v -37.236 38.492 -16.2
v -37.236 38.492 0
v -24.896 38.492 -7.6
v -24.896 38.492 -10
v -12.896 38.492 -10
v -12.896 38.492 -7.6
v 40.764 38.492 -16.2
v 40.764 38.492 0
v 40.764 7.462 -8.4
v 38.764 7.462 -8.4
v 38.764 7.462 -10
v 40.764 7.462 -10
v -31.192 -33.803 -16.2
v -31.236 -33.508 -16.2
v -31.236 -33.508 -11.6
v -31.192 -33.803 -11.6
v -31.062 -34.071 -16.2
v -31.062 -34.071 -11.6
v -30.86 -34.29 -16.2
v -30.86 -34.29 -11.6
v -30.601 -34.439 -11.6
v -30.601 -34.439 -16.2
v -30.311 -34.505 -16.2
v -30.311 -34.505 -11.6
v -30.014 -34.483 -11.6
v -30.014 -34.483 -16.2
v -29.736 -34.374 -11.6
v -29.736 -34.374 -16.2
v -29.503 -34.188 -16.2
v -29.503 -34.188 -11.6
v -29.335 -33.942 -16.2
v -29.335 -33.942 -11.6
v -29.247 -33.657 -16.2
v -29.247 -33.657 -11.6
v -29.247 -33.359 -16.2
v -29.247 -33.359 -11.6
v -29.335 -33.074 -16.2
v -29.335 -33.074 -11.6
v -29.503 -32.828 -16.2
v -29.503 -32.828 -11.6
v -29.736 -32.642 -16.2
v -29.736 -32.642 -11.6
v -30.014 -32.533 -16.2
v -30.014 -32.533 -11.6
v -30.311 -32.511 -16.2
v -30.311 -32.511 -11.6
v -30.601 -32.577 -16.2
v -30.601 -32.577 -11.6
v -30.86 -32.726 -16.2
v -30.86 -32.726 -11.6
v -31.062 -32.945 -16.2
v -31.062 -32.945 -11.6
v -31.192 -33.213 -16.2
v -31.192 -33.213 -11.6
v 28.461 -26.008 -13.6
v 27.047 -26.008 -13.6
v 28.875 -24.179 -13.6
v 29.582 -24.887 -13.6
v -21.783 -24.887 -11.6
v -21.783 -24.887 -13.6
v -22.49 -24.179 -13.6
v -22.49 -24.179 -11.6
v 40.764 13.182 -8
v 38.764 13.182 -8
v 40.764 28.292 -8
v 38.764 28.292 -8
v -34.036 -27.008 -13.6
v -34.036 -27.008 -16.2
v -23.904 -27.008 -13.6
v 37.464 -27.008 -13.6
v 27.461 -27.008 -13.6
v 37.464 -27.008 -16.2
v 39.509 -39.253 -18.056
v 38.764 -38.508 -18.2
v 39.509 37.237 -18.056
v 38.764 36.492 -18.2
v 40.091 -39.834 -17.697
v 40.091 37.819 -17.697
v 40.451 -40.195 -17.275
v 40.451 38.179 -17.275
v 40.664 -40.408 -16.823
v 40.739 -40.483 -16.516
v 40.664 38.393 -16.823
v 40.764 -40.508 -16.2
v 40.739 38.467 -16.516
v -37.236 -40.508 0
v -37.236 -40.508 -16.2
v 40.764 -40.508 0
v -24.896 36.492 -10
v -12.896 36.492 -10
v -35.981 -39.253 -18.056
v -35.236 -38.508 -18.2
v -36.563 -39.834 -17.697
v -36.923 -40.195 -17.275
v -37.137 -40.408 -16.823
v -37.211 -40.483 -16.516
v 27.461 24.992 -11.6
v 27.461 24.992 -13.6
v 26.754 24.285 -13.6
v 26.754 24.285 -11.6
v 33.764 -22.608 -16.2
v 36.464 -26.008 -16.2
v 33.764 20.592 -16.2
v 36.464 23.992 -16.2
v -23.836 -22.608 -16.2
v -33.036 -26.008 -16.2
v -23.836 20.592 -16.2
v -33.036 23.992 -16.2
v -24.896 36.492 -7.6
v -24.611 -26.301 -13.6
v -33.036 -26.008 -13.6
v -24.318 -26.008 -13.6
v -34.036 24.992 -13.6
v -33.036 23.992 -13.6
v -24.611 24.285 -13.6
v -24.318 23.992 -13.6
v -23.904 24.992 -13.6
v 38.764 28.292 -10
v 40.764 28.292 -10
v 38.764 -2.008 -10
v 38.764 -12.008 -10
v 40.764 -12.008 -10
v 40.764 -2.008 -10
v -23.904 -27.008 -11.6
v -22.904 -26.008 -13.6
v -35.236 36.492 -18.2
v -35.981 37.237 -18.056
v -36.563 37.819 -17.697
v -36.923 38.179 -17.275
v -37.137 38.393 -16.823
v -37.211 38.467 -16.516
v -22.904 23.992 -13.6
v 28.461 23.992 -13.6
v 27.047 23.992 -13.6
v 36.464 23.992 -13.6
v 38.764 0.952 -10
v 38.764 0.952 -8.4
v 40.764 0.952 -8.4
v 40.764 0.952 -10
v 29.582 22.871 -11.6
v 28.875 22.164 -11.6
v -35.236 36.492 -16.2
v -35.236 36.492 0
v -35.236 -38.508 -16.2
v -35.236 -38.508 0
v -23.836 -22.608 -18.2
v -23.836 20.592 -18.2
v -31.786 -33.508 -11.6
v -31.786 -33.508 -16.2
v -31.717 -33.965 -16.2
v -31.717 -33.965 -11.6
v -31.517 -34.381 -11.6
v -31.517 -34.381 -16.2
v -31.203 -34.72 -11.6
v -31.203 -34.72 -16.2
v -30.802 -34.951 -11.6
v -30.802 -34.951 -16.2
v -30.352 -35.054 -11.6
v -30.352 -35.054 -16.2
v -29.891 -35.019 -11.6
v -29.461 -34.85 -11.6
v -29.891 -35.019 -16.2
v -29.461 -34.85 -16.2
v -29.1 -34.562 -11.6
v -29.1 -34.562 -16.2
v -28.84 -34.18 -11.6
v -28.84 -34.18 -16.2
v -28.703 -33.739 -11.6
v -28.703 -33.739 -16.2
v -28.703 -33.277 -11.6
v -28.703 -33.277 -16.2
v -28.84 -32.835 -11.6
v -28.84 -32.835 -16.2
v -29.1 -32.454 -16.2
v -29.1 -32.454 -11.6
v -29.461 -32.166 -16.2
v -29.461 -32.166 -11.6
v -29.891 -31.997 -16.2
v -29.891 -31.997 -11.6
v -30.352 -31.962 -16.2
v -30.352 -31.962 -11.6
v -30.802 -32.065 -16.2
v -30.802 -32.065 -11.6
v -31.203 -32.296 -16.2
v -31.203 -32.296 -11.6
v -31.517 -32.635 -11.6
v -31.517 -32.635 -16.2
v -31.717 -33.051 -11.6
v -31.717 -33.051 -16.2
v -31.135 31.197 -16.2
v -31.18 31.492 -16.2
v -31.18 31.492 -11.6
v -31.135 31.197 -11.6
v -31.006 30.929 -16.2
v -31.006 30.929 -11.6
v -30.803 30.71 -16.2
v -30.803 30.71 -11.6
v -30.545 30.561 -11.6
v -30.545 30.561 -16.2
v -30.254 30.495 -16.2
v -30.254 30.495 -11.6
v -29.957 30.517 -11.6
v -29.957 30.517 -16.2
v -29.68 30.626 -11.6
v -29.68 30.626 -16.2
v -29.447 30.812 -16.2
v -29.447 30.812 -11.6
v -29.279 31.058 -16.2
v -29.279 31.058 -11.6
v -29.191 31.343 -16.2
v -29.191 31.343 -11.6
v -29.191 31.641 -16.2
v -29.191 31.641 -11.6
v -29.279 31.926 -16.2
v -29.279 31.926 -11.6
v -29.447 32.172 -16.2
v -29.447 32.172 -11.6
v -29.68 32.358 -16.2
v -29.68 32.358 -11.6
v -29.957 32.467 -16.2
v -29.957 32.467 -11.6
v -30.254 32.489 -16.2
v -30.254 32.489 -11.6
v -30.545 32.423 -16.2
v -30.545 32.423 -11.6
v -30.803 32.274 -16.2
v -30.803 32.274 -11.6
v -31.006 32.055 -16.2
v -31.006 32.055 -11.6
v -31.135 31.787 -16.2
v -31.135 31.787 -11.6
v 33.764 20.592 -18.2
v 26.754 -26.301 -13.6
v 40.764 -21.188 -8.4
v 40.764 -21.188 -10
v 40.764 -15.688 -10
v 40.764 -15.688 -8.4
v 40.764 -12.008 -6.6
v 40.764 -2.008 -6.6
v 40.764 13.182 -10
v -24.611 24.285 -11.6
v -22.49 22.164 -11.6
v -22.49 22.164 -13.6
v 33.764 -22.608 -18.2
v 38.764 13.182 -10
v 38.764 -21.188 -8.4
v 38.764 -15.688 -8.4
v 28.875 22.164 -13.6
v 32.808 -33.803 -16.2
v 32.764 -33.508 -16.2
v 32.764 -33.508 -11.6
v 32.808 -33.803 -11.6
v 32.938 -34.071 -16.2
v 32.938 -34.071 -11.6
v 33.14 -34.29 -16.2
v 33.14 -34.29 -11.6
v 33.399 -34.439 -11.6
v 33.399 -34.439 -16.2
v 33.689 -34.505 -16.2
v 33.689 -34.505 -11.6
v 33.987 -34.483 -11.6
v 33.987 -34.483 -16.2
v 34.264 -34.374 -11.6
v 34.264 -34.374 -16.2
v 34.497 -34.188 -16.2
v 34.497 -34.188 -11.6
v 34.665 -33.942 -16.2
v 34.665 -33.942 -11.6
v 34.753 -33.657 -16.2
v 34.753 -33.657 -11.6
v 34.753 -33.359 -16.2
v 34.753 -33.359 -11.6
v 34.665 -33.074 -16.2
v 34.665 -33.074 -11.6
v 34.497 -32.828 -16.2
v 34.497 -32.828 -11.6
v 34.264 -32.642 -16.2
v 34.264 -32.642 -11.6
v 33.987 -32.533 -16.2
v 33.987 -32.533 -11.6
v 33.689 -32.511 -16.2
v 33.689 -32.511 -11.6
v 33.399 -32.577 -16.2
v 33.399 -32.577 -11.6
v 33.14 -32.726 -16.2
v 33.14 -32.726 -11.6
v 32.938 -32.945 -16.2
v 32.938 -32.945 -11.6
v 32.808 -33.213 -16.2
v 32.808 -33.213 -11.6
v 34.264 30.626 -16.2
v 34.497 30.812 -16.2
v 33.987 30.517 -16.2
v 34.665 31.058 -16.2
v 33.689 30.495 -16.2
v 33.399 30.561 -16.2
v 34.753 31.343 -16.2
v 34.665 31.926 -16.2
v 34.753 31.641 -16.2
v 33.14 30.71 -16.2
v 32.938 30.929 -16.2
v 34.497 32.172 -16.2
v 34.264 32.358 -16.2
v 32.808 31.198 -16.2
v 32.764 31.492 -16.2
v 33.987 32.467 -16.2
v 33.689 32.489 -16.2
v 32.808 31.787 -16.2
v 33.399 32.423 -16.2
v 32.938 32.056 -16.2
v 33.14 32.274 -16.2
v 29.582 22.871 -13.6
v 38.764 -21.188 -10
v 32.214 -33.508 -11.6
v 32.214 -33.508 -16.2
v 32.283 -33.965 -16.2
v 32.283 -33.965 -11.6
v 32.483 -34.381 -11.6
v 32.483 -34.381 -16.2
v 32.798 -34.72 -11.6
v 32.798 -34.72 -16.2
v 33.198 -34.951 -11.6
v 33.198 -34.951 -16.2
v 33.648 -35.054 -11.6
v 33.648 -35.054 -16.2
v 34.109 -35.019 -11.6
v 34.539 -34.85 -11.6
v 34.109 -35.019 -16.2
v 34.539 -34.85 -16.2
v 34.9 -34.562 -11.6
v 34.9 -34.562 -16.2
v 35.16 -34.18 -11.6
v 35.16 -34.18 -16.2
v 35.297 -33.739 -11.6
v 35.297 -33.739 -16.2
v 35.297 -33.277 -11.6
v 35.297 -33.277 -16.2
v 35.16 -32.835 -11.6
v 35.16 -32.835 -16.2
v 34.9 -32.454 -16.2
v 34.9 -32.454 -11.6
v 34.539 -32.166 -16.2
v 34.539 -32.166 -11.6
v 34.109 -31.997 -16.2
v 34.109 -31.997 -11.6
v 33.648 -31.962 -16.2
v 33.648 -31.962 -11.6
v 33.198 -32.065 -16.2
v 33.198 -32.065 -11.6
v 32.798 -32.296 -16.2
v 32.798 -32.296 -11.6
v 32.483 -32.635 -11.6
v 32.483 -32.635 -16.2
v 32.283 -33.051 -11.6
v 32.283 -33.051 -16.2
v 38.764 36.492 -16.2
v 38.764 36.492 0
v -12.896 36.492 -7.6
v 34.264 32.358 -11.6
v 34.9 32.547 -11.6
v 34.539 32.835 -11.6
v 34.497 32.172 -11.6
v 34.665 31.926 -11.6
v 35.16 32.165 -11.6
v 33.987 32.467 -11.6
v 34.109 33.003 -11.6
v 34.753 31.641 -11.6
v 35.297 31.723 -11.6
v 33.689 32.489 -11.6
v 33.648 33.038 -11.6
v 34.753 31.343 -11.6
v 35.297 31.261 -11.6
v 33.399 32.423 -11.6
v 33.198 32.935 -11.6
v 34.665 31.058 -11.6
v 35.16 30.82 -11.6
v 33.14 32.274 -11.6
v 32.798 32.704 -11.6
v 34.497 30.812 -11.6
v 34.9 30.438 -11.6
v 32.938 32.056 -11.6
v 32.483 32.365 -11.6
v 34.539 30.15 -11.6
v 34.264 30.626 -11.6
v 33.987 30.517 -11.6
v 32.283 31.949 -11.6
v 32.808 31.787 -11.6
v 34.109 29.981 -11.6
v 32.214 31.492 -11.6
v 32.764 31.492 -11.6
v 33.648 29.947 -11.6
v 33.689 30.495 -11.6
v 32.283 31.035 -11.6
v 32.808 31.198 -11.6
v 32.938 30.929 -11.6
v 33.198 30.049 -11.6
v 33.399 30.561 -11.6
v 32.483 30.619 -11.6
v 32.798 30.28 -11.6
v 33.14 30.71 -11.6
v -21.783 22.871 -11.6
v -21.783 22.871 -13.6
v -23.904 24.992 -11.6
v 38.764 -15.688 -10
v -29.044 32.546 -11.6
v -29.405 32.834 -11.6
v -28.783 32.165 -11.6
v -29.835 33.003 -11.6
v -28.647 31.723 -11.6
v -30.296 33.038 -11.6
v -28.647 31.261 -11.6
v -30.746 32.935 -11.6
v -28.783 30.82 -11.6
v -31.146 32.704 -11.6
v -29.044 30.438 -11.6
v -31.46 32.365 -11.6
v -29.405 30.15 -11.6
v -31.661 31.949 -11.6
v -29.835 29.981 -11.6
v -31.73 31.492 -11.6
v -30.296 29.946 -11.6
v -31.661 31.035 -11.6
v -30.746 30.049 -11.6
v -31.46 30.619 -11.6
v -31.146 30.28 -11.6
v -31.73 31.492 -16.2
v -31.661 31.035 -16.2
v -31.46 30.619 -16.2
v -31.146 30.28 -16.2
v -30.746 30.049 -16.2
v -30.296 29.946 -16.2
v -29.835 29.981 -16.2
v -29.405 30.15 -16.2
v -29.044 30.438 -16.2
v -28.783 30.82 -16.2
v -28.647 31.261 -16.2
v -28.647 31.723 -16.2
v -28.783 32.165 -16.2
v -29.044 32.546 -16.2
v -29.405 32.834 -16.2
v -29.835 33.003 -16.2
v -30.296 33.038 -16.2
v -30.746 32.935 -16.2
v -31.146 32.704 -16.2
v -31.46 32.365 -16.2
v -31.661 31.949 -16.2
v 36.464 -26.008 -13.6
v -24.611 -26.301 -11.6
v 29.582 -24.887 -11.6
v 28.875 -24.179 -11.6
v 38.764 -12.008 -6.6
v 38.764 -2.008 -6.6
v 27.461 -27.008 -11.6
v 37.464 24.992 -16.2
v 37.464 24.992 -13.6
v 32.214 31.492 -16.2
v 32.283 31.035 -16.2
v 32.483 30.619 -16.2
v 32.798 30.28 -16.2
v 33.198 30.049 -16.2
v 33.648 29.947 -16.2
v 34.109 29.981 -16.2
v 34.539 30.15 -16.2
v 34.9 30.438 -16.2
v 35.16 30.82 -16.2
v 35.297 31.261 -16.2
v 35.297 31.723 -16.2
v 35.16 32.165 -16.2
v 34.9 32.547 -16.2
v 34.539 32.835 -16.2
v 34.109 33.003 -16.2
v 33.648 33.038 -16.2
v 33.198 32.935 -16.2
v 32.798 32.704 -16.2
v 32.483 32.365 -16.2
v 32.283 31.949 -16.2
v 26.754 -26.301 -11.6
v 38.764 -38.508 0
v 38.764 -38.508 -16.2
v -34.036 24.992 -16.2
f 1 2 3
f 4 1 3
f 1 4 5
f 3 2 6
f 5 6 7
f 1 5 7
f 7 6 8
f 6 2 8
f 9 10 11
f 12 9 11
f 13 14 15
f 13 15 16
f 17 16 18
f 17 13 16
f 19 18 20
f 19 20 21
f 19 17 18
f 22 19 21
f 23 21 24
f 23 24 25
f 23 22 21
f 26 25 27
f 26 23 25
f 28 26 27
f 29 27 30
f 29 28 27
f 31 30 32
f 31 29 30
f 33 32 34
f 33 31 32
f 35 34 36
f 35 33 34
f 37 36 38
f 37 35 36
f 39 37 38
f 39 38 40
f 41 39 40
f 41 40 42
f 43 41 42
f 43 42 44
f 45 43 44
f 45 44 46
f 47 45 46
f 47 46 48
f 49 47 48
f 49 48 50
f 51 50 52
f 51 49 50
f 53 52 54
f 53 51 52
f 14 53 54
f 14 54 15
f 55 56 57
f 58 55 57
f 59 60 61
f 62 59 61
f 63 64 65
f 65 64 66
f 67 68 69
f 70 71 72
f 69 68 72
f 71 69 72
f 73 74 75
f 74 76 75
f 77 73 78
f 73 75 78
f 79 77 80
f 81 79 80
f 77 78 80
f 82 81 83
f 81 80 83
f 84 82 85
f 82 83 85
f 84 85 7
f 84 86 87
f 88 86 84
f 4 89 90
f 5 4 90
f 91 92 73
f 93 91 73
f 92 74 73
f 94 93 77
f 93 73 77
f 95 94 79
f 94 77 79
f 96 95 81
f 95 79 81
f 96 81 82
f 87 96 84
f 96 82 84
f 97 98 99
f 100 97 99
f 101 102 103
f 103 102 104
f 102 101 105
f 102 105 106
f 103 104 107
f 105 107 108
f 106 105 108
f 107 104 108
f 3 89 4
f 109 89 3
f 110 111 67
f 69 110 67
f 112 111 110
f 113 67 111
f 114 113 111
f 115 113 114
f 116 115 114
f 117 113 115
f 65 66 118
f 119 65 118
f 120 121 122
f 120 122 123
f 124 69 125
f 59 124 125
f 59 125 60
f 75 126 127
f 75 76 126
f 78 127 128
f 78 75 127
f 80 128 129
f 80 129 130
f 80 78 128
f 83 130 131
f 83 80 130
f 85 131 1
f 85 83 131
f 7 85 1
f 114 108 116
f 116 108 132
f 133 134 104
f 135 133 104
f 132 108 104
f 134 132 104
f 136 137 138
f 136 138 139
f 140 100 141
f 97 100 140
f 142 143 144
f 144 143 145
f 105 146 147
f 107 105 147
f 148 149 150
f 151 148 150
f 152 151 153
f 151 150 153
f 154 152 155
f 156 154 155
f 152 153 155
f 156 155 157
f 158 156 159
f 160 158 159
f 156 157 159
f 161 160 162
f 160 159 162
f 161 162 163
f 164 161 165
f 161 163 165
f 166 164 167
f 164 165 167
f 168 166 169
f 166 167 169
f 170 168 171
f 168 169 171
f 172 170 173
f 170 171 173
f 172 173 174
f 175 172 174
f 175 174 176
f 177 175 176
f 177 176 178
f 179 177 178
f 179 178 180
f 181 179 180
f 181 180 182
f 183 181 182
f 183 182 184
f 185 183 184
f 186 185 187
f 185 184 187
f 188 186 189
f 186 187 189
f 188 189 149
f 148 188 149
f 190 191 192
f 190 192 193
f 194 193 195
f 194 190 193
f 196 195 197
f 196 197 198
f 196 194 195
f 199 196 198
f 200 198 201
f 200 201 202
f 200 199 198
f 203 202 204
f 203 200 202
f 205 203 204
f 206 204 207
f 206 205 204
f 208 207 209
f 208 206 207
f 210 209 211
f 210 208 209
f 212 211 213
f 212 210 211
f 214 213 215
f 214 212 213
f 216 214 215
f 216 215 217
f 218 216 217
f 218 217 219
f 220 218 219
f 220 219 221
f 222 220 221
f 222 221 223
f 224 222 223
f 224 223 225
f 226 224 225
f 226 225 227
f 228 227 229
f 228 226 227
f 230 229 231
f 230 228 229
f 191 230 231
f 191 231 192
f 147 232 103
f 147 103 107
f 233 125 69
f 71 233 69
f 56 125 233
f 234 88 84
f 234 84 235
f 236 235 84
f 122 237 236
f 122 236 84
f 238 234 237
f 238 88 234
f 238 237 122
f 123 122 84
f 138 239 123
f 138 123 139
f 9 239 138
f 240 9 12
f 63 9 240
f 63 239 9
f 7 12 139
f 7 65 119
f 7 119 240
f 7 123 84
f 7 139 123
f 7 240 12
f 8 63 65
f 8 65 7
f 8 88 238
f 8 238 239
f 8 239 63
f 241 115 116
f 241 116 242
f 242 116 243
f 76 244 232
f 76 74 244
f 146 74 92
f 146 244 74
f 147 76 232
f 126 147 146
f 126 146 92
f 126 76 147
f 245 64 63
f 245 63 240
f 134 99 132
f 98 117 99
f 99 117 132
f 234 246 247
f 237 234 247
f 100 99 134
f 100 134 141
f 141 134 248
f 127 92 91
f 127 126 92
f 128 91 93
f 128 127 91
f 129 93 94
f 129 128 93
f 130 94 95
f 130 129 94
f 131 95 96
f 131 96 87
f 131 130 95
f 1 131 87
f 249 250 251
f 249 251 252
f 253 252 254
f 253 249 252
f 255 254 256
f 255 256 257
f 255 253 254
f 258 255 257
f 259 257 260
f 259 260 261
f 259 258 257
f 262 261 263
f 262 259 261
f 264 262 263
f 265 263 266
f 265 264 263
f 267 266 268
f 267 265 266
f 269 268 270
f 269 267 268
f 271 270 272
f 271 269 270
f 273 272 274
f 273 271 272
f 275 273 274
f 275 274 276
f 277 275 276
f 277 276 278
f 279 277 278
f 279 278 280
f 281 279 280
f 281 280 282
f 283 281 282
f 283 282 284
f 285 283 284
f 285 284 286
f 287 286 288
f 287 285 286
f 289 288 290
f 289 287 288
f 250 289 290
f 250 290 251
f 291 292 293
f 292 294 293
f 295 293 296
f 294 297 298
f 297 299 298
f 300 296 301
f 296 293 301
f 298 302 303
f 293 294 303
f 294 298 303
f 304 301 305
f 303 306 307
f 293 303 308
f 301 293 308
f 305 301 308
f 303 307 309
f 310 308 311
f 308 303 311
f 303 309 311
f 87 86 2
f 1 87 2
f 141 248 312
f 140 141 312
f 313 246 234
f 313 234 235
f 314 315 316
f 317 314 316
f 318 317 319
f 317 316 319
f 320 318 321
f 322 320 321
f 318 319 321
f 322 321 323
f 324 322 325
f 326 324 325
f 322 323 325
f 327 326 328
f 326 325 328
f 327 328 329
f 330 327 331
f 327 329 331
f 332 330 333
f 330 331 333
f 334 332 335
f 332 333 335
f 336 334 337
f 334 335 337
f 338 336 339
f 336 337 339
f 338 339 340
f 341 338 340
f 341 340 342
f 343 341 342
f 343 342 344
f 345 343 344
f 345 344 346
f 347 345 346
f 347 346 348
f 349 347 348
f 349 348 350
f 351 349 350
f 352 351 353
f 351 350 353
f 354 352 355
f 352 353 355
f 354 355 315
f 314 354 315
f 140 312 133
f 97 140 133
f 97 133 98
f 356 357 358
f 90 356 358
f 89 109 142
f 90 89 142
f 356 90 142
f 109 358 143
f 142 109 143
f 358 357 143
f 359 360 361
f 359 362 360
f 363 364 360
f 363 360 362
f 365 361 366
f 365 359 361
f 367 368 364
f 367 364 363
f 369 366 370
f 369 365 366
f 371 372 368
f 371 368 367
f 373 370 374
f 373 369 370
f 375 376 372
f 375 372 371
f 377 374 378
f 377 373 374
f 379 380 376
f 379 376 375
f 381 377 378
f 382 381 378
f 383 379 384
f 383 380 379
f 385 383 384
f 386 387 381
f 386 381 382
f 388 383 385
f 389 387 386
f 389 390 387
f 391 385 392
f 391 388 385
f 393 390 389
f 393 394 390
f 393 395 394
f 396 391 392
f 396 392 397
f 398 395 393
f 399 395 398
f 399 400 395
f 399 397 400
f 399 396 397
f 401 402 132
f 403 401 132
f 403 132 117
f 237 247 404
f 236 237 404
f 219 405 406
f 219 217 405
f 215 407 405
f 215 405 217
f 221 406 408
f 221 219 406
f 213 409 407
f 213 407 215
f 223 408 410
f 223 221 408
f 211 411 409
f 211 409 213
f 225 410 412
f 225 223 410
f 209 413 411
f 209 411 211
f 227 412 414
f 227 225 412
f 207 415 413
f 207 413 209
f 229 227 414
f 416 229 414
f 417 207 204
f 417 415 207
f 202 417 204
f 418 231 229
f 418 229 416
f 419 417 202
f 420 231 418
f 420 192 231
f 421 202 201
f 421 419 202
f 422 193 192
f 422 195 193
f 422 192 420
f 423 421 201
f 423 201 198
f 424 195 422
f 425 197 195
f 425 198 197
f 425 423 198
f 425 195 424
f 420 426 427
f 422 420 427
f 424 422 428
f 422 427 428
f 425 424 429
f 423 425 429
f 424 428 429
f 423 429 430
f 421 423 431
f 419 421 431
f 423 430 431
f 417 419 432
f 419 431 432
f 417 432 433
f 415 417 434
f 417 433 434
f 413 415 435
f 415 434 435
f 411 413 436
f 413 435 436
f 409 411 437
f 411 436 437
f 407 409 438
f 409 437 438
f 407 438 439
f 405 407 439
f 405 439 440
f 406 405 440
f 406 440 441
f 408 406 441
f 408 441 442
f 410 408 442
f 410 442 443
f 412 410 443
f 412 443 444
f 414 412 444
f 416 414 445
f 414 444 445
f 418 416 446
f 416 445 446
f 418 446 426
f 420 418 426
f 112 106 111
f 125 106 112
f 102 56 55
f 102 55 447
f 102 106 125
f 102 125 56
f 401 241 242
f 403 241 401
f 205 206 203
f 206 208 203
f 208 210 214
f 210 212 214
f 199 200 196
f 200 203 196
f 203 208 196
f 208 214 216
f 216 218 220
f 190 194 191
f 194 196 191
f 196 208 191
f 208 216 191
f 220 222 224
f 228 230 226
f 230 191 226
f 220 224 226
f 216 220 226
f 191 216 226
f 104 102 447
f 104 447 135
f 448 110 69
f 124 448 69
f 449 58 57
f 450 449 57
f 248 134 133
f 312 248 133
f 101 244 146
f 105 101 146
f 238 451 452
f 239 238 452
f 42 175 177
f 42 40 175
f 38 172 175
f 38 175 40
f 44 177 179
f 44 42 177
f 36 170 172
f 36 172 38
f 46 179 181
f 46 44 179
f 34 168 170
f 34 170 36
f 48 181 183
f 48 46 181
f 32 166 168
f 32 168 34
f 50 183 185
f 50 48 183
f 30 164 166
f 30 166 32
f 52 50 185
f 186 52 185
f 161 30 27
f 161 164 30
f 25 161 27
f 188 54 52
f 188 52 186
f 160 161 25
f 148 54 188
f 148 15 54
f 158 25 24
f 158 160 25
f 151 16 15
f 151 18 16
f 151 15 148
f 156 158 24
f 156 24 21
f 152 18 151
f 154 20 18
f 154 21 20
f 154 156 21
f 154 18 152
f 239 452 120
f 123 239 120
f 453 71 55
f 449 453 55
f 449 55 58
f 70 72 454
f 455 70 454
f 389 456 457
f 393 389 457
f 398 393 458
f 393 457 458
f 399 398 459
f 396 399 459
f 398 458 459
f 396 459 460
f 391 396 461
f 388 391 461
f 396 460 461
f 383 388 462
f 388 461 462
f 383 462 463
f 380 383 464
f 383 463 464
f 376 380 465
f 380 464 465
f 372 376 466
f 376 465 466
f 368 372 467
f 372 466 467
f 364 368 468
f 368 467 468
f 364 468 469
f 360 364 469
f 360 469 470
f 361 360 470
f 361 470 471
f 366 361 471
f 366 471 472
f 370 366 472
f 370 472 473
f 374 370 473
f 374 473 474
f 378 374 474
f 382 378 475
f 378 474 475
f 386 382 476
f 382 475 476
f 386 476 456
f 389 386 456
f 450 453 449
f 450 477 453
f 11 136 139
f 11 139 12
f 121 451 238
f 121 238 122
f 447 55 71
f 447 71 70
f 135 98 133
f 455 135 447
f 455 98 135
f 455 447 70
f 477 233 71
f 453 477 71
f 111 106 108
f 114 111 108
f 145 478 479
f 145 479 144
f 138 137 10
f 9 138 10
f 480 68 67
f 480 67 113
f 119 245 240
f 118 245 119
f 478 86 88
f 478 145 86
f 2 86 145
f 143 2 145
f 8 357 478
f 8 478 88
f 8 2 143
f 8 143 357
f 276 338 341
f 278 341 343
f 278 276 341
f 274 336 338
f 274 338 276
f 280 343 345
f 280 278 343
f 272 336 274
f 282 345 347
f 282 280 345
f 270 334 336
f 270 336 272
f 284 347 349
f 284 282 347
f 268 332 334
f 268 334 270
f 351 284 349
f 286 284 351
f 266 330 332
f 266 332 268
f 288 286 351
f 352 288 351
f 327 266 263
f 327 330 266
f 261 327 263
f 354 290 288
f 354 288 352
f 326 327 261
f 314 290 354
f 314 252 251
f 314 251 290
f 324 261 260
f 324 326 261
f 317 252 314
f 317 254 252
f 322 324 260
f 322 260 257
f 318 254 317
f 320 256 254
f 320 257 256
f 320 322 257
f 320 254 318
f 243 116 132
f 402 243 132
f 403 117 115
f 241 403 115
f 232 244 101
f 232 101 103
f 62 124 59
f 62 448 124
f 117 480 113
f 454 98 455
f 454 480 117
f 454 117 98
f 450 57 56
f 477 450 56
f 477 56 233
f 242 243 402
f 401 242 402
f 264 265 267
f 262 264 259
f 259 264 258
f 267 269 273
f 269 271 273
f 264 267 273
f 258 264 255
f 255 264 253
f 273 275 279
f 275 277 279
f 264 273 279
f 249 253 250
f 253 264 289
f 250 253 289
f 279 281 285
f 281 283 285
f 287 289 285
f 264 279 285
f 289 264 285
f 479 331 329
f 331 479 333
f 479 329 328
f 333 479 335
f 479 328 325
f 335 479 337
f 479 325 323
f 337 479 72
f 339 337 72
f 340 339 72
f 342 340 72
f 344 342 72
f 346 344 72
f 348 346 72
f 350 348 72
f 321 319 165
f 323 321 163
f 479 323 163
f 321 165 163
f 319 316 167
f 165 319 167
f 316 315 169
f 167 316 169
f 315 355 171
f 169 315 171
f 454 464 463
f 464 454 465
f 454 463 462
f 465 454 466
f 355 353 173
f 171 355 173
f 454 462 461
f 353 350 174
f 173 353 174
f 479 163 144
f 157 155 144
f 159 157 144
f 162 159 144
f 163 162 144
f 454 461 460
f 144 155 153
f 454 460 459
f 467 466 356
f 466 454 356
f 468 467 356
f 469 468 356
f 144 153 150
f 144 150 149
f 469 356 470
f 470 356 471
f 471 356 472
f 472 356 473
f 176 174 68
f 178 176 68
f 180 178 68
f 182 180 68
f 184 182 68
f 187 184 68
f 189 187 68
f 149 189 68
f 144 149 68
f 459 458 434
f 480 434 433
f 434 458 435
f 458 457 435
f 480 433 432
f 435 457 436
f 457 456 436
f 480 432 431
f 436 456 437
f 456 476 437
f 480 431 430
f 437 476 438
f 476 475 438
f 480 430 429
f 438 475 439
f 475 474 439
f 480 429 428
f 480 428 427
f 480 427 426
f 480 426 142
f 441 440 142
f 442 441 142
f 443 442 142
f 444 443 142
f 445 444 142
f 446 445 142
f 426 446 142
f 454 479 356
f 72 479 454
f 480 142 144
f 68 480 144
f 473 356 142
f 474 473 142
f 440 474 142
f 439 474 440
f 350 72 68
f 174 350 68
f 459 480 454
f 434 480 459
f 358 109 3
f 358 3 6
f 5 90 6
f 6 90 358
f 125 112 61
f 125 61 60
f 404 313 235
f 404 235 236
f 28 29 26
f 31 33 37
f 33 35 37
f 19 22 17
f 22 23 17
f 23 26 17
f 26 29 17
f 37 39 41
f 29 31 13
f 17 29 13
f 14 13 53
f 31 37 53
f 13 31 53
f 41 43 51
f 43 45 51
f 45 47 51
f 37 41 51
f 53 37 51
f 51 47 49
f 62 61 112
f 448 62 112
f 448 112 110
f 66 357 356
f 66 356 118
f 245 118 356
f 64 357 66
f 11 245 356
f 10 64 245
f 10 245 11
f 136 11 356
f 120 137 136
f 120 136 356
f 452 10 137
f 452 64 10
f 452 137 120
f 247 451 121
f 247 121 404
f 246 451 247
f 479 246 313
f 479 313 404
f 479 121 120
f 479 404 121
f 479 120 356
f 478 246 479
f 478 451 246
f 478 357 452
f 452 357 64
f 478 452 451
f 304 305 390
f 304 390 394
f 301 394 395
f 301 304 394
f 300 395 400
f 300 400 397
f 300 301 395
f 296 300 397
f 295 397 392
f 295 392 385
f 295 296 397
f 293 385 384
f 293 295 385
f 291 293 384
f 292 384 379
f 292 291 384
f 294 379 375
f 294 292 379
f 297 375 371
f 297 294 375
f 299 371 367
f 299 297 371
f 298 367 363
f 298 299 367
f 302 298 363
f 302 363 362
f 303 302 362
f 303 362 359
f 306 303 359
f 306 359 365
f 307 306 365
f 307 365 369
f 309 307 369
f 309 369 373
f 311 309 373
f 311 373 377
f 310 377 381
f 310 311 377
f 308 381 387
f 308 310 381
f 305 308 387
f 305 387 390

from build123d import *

# Parameters (mm, degrees)
SKETCH_876_W           = 78
SKETCH_876_H           = 79
EXTRUDE_1660_DEPTH     = 18.2
SKETCH_1708_W          = 74.00014986
SKETCH_1708_H          = 75.0001524
SKETCH_1708_W_2        = 69.2
SKETCH_1708_H_2        = 50
SKETCH_1708_W_3        = 57.6
SKETCH_1708_H_3        = 43.2
LCD_DEPTH              = 2
LCD_2_OUTLINE_W        = 71.5
LCD_2_OUTLINE_H        = 52
LCD_2_OUTLINE_W_2      = 69.5
LCD_2_OUTLINE_H_2      = 50
LCD_2_DEPTH            = 2.6
LCD_3_DEPTH            = 2
SKETCH_9_R             = 1.55
SKETCH_9_R_2           = 1.00000254
PCB_DEPTH              = 4.6
USB_START              = 74.00015
SKETCH_11_W            = 1.6
SKETCH_11_H            = 5.5
SKETCH_11_W_2          = 3.4
SKETCH_11_H_2          = 10
SKETCH_11_W_3          = 2
SKETCH_11_H_3          = 15.11
SKETCH_11_H_4          = 6.51
USB_DEPTH              = 1.999925
CUT_EXTRUDE_7042_REACH = 91.005
SKETCH_12_W            = 12
SKETCH_12_H            = 2.4
FILLET_1_R             = 2


# Read off the part's stored shape, not the designer's step: LCD边框
with BuildPart() as part:
    # Sketch 876 → Extrude 1660 (new body)
    with BuildSketch(Plane.XY):
        with Locations((1.76392246, -1.007858704)):
            Rectangle(SKETCH_876_W, SKETCH_876_H)
        Polygon((-17.23611691, -38.507858704), (-14.23610929, -38.507858704), (38.76399739, -38.507858704), (38.76399739, -20.507823144), (38.76399739, 15.492250516), (38.76399739, 36.492293696), (-35.23615247, 36.492293696), (-35.23615247, -38.507858704), align=None, mode=Mode.SUBTRACT)
    extrude(amount=-EXTRUDE_1660_DEPTH)

    # Sketch 1708 → LCD (add)
    # profile 1 of 2: a face of its own
    with BuildSketch(Plane(origin=(0, 0, -18.2), x_dir=(-1, 0, 0), z_dir=(0, 0, -1))):
        with Locations((-1.76392246, -1.007782504)):
            Rectangle(SKETCH_1708_W, SKETCH_1708_H)
        with Locations((-1.76392246, -1.007858704)):
            Rectangle(SKETCH_1708_W_2, SKETCH_1708_H_2, mode=Mode.SUBTRACT)
    # profile 2 of 2: a face of its own
    with BuildSketch(Plane(origin=(0, 0, -18.2), x_dir=(-1, 0, 0), z_dir=(0, 0, -1))):
        with Locations((-1.76392246, -1.007858704)):
            Rectangle(SKETCH_1708_W_2, SKETCH_1708_H_2)
        with Locations((-4.96392246, -1.007858704)):
            Rectangle(SKETCH_1708_W_3, SKETCH_1708_H_3, mode=Mode.SUBTRACT)
    extrude(amount=-LCD_DEPTH)

    # LCD 2 outline → LCD 2 (add)
    with BuildSketch(Plane.XY.offset(-16.2)):
        with Locations((1.71392246, -1.007858704)):
            Rectangle(LCD_2_OUTLINE_W, LCD_2_OUTLINE_H)
        with Locations((1.71392246, -1.007858704)):
            Rectangle(LCD_2_OUTLINE_W_2, LCD_2_OUTLINE_H_2, mode=Mode.SUBTRACT)
    extrude(amount=LCD_2_DEPTH)

    # 草图7 → LCD 3 (add)
    with BuildSketch(Plane.XY.offset(-13.6)):
        Polygon((-23.904159925, -27.007858704), (-21.782839581, -24.886538361), (-22.489946362, -24.17943158), (-24.611266706, -26.300751923), align=None)
        Polygon((27.461068732, -27.007858704), (29.582389075, -24.886538361), (28.875282294, -24.17943158), (26.75396195, -26.300751923), align=None)
        Polygon((26.75396195, 24.285034514), (28.875282294, 22.163714171), (29.582389075, 22.870820952), (27.461068732, 24.992141296), align=None)
        Polygon((-24.611266706, 24.285034514), (-22.489946362, 22.163714171), (-21.782839581, 22.870820952), (-23.904159925, 24.992141296), align=None)
    extrude(amount=LCD_3_DEPTH)

    # 草图9 → PCB螺丝位 (add)
    # profile 1 of 4: a face of its own
    with BuildSketch(Plane.XY.offset(-16.2)):
        with Locations(Location((-30.179759278, 31.492141296, 0), (0, 0, 180))):
            Circle(SKETCH_9_R)
        with Locations(Location((-30.179759278, 31.492141296, 0), (0, 0, 180))):
            Circle(SKETCH_9_R_2, mode=Mode.SUBTRACT)
    # profile 2 of 4: a face of its own
    with BuildSketch(Plane.XY.offset(-16.2)):
        with Locations(Location((33.76398723, 31.492283536, 0), (0, 0, 180))):
            Circle(SKETCH_9_R)
        with Locations(Location((33.76398723, 31.492283536, 0), (0, 0, 180))):
            Circle(SKETCH_9_R_2, mode=Mode.SUBTRACT)
    # profile 3 of 4: a face of its own
    with BuildSketch(Plane.XY.offset(-16.2)):
        with Locations(Location((33.76398723, -33.507848544, 0), (0, 0, 180))):
            Circle(SKETCH_9_R)
        with Locations(Location((33.76398723, -33.507848544, 0), (0, 0, 180))):
            Circle(SKETCH_9_R_2, mode=Mode.SUBTRACT)
    # profile 4 of 4: a face of its own
    with BuildSketch(Plane.XY.offset(-16.2)):
        with Locations(Location((-30.23614231, -33.507848544, 0), (0, 0, 180))):
            Circle(SKETCH_9_R)
        with Locations(Location((-30.23614231, -33.507848544, 0), (0, 0, 180))):
            Circle(SKETCH_9_R_2, mode=Mode.SUBTRACT)
    extrude(amount=PCB_DEPTH)

    # 草图11 → 切除-USB边 (cut)
    with BuildSketch(Plane(origin=(-35.23615247, 0, 0), x_dir=(0, 0, -1), z_dir=(1, 0, 0)).offset(USB_START)):
        with Locations((9.2, -18.437706304)):
            Rectangle(SKETCH_11_W, SKETCH_11_H)
        with Locations((8.3, -7.007706304)):
            Rectangle(SKETCH_11_W_2, SKETCH_11_H_2)
        with Locations((9, 20.737293696)):
            Rectangle(SKETCH_11_W_3, SKETCH_11_H_3)
        with Locations((9.2, 4.207293696)):
            Rectangle(SKETCH_11_W, SKETCH_11_H_4)
    extrude(amount=USB_DEPTH, mode=Mode.SUBTRACT)

    # 草图12 → Cut-Extrude 7042 (cut, up to next)
    with BuildSketch(Plane.XZ.offset(-36.492293696), mode=Mode.PRIVATE) as cut_extrude_7042_sk1:
        with Locations((-18.89615247, -8.8)):
            Rectangle(SKETCH_12_W, SKETCH_12_H)
    cut_extrude_7042_tool1 = extrude(cut_extrude_7042_sk1.sketch, amount=-CUT_EXTRUDE_7042_REACH, mode=Mode.PRIVATE) & part.part
    add(cut_extrude_7042_tool1.solids().sort_by_distance((-18.896152, 36.492294, -8.8))[0], mode=Mode.SUBTRACT)

    # 圆角1
    fillet_1_edges = [part.edges().sort_by_distance(p)[0] for p in [
        (-37.23607754, -1.007858704, -18.2),
        (1.76392246, -40.507858704, -18.2),
        (40.76392246, -1.007858704, -18.2),
        (1.76392246, 38.492141296, -18.2),
    ]]
    fillet(fillet_1_edges, radius=FILLET_1_R)


solid = part.part
